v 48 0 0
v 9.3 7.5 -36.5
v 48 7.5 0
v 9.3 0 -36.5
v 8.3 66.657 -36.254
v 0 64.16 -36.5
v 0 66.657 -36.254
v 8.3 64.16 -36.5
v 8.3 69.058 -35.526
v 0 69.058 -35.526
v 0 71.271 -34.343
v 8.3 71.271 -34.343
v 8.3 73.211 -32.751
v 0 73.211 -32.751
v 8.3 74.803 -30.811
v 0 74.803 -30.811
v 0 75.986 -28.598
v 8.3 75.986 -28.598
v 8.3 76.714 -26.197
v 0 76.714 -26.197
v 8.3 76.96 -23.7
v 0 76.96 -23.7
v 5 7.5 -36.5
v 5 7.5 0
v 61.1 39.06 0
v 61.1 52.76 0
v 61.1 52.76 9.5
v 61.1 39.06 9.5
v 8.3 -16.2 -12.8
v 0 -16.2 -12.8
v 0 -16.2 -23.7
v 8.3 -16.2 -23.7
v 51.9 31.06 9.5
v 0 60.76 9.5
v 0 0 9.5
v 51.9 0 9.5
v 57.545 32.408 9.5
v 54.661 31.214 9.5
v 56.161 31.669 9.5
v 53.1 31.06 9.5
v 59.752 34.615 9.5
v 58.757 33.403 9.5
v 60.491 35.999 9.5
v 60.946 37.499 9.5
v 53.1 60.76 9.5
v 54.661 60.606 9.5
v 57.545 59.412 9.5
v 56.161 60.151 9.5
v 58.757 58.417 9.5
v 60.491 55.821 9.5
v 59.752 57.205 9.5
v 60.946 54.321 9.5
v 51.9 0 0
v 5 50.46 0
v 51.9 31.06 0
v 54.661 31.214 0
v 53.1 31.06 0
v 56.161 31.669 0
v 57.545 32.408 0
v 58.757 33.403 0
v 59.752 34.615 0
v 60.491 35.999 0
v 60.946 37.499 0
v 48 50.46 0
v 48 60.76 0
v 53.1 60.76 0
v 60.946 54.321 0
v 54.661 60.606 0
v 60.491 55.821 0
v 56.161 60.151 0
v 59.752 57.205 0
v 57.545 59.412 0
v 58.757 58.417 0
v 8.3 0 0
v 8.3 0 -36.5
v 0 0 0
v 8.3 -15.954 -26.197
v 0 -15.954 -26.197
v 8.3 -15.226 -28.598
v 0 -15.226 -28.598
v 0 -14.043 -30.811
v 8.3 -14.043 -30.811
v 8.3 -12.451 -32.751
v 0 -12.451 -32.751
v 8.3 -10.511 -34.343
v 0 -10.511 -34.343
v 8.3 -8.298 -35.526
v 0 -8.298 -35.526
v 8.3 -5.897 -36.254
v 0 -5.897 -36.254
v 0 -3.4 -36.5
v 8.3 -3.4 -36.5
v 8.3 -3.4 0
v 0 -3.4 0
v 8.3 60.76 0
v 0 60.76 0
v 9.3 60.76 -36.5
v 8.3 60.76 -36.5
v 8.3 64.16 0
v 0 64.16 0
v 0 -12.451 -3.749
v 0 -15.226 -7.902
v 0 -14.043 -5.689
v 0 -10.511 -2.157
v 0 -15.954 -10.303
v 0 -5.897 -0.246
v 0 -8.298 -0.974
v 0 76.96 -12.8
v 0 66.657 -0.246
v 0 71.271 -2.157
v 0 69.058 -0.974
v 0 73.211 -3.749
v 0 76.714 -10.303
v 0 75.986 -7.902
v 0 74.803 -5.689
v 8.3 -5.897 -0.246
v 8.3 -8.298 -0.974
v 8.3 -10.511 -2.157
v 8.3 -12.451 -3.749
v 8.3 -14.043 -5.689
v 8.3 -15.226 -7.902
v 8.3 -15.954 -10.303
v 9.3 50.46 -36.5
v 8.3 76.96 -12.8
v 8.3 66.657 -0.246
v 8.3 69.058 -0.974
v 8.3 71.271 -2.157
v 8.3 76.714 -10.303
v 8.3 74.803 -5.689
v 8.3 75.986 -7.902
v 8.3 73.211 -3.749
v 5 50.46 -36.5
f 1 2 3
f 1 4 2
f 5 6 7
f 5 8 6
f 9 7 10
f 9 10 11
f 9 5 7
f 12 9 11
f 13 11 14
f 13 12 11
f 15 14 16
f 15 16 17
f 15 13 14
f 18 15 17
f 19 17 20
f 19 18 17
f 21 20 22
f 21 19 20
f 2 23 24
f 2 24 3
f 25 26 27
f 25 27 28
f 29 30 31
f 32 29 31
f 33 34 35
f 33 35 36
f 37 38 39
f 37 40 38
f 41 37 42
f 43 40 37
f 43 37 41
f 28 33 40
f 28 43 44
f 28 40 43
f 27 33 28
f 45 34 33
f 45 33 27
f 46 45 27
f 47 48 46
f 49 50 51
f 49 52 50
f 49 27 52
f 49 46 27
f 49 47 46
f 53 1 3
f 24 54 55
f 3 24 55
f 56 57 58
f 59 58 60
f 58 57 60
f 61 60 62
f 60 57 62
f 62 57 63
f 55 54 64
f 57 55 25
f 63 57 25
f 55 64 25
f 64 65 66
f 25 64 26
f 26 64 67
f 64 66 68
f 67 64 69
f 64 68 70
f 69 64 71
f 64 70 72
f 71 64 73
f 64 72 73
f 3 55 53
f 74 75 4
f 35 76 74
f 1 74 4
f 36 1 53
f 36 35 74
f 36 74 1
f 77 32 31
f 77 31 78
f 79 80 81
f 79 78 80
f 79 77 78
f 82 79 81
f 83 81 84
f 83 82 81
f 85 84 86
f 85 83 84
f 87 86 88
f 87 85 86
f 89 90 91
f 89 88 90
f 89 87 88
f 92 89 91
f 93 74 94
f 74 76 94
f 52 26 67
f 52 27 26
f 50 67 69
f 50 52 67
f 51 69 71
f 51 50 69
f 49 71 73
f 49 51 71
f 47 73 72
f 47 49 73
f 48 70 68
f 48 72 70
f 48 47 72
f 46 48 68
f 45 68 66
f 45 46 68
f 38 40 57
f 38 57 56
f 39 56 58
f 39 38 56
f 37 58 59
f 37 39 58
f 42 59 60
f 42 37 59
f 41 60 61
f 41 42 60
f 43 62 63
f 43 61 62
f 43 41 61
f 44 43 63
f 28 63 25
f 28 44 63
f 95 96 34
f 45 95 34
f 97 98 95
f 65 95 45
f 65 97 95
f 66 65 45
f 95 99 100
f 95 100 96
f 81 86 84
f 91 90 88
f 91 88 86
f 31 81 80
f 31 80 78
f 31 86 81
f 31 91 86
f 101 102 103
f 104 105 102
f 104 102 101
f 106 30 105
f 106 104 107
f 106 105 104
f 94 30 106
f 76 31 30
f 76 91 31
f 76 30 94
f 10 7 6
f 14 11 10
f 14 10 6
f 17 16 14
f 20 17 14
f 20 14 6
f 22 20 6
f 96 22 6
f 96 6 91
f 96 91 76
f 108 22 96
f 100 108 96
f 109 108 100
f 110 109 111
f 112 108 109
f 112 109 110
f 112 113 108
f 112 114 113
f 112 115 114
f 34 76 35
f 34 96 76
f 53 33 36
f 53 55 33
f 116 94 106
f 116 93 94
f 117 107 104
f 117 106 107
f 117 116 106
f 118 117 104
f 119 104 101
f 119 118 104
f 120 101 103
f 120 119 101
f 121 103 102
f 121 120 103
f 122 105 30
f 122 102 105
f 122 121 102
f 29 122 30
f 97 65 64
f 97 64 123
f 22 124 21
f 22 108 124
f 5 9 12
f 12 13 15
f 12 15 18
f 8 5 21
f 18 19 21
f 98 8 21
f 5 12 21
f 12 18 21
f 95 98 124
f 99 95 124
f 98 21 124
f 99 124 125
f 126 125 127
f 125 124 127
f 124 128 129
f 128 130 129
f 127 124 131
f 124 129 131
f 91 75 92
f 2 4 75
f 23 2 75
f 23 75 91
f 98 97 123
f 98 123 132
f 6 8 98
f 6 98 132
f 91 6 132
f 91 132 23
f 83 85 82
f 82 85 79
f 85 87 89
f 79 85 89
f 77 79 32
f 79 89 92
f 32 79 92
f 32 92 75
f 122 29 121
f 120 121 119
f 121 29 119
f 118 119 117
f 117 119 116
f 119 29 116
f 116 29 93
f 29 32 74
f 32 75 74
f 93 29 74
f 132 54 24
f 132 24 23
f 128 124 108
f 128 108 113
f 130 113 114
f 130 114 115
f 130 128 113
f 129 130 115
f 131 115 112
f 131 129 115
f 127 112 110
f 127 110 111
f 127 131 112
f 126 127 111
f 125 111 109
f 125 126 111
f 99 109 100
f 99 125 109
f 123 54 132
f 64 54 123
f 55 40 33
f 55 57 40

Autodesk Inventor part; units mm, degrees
ref_plane "YZ Plane" through (0, 0, 0) normal (1, 0, 0) x (0, 1, 0)
ref_plane "XZ Plane" through (0, 0, 0) normal (0, 1, 0) x (-1, 0, 0)
ref_plane "XY Plane" through (0, 0, 0) normal (0, 0, 1) x (1, 0, 0)
sketch "Sketch1" plane through (0, 0, 0) normal (0, 0, 1) x (1, 0, 0)
  line L0 (0, 0) -> (0, 60.76)
  line L1 (0, 60.76) -> (51.9, 60.76)
  line L2 (51.9, 31.06) -> (51.9, 0)
  line L3 (51.9, 0) -> (0, 0)
  line L4 (51.9, 60.76) -> (61.1, 60.76)
  line L5 (61.1, 60.76) -> (61.1, 31.06)
  line L6 (61.1, 31.06) -> (51.9, 31.06)
  dimension "d0" = 60.76
  dimension "d1" = 51.9
  dimension "d2" = 9.2
  dimension "d3" = 29.7
extrude "Extrusion1" add sketch "Sketch1" along normal blind 9.5
fillet "Fillet1" radius 8 2 edges at (61.1, 60.76, 4.75) (61.1, 31.06, 4.75)
sketch "Sketch2" plane through (0, 0, 0) normal (0, -1, 0) x (1, 0, 0)
  line L0 (51.9, 0) -> (0, 0) projected
  line L1 (0, -36.5) -> (0, 0)
  line L2 (0, -36.5) -> (9.3, -36.5)
  line L3 (9.3, -36.5) -> (48, 0)
  point P0 (0, 9.5)
  dimension "d7" = 46
  dimension "d8" = 3.9
  dimension "d9" = 9.3
extrude "Extrusion2" add sketch "Sketch2" against normal blind 7.5
sketch "Sketch3" plane through (0, 60.76, 9.5) normal (0, 1, 0) x (1, 0, 0)
  line L0 (0, 46) -> (0, 9.5) projected
  line L1 (48, 9.5) -> (0, 9.5) projected
  line L2 (48, 9.5) -> (9.3, 46) projected
  line L3 (9.3, 46) -> (0, 46) projected
extrude "Extrusion3" add sketch "Sketch3" against normal blind 10.3
sketch "Sketch4" plane through (0, 0, 9.5) normal (-1, 0, 0) x (0, 0, 1)
  line L0 (-46, 60.76) -> (0, 60.76) projected
  line L1 (-9.5, 7.5) -> (-9.5, 50.46) projected
  line L2 (-46, 0) -> (-46, 7.5) projected
  line L3 (-46, -16.2) -> (-46, 76.96)
  line L4 (-9.5, 76.96) -> (-9.5, -16.2)
  line L5 (-9.5, -16.2) -> (-46, -16.2)
  line L6 (-9.5, 76.96) -> (-46, 76.96)
  point P0 (-9.5, 0)
  dimension "d15" = 93.16
  dimension "d16" = 16.2
extrude "Extrusion4" add sketch "Sketch4" against normal blind 8.3
sketch "Sketch5" plane through (8.3, 0, 9.5) normal (1, 0, 0) x (0, 0, -1)
  line L0 (9.5, 50.46) -> (46, 50.46) projected
  line L1 (9.5, 7.5) -> (9.5, 50.46) projected
  line L2 (46, 7.5) -> (9.5, 7.5) projected
  line L3 (46, 7.5) -> (46, 50.46) projected
  point P0 (9.5, 0)
extrude "Extrusion5" cut sketch "Sketch5" against normal blind 3.3
fillet "Fillet2" radius 12.8 4 edges at (4.15, 76.96, -36.5) (4.15, -16.2, -36.5) (4.15, -16.2, 0) (4.15, 76.96, 0)
properties part number "FelixOriginalBase"
